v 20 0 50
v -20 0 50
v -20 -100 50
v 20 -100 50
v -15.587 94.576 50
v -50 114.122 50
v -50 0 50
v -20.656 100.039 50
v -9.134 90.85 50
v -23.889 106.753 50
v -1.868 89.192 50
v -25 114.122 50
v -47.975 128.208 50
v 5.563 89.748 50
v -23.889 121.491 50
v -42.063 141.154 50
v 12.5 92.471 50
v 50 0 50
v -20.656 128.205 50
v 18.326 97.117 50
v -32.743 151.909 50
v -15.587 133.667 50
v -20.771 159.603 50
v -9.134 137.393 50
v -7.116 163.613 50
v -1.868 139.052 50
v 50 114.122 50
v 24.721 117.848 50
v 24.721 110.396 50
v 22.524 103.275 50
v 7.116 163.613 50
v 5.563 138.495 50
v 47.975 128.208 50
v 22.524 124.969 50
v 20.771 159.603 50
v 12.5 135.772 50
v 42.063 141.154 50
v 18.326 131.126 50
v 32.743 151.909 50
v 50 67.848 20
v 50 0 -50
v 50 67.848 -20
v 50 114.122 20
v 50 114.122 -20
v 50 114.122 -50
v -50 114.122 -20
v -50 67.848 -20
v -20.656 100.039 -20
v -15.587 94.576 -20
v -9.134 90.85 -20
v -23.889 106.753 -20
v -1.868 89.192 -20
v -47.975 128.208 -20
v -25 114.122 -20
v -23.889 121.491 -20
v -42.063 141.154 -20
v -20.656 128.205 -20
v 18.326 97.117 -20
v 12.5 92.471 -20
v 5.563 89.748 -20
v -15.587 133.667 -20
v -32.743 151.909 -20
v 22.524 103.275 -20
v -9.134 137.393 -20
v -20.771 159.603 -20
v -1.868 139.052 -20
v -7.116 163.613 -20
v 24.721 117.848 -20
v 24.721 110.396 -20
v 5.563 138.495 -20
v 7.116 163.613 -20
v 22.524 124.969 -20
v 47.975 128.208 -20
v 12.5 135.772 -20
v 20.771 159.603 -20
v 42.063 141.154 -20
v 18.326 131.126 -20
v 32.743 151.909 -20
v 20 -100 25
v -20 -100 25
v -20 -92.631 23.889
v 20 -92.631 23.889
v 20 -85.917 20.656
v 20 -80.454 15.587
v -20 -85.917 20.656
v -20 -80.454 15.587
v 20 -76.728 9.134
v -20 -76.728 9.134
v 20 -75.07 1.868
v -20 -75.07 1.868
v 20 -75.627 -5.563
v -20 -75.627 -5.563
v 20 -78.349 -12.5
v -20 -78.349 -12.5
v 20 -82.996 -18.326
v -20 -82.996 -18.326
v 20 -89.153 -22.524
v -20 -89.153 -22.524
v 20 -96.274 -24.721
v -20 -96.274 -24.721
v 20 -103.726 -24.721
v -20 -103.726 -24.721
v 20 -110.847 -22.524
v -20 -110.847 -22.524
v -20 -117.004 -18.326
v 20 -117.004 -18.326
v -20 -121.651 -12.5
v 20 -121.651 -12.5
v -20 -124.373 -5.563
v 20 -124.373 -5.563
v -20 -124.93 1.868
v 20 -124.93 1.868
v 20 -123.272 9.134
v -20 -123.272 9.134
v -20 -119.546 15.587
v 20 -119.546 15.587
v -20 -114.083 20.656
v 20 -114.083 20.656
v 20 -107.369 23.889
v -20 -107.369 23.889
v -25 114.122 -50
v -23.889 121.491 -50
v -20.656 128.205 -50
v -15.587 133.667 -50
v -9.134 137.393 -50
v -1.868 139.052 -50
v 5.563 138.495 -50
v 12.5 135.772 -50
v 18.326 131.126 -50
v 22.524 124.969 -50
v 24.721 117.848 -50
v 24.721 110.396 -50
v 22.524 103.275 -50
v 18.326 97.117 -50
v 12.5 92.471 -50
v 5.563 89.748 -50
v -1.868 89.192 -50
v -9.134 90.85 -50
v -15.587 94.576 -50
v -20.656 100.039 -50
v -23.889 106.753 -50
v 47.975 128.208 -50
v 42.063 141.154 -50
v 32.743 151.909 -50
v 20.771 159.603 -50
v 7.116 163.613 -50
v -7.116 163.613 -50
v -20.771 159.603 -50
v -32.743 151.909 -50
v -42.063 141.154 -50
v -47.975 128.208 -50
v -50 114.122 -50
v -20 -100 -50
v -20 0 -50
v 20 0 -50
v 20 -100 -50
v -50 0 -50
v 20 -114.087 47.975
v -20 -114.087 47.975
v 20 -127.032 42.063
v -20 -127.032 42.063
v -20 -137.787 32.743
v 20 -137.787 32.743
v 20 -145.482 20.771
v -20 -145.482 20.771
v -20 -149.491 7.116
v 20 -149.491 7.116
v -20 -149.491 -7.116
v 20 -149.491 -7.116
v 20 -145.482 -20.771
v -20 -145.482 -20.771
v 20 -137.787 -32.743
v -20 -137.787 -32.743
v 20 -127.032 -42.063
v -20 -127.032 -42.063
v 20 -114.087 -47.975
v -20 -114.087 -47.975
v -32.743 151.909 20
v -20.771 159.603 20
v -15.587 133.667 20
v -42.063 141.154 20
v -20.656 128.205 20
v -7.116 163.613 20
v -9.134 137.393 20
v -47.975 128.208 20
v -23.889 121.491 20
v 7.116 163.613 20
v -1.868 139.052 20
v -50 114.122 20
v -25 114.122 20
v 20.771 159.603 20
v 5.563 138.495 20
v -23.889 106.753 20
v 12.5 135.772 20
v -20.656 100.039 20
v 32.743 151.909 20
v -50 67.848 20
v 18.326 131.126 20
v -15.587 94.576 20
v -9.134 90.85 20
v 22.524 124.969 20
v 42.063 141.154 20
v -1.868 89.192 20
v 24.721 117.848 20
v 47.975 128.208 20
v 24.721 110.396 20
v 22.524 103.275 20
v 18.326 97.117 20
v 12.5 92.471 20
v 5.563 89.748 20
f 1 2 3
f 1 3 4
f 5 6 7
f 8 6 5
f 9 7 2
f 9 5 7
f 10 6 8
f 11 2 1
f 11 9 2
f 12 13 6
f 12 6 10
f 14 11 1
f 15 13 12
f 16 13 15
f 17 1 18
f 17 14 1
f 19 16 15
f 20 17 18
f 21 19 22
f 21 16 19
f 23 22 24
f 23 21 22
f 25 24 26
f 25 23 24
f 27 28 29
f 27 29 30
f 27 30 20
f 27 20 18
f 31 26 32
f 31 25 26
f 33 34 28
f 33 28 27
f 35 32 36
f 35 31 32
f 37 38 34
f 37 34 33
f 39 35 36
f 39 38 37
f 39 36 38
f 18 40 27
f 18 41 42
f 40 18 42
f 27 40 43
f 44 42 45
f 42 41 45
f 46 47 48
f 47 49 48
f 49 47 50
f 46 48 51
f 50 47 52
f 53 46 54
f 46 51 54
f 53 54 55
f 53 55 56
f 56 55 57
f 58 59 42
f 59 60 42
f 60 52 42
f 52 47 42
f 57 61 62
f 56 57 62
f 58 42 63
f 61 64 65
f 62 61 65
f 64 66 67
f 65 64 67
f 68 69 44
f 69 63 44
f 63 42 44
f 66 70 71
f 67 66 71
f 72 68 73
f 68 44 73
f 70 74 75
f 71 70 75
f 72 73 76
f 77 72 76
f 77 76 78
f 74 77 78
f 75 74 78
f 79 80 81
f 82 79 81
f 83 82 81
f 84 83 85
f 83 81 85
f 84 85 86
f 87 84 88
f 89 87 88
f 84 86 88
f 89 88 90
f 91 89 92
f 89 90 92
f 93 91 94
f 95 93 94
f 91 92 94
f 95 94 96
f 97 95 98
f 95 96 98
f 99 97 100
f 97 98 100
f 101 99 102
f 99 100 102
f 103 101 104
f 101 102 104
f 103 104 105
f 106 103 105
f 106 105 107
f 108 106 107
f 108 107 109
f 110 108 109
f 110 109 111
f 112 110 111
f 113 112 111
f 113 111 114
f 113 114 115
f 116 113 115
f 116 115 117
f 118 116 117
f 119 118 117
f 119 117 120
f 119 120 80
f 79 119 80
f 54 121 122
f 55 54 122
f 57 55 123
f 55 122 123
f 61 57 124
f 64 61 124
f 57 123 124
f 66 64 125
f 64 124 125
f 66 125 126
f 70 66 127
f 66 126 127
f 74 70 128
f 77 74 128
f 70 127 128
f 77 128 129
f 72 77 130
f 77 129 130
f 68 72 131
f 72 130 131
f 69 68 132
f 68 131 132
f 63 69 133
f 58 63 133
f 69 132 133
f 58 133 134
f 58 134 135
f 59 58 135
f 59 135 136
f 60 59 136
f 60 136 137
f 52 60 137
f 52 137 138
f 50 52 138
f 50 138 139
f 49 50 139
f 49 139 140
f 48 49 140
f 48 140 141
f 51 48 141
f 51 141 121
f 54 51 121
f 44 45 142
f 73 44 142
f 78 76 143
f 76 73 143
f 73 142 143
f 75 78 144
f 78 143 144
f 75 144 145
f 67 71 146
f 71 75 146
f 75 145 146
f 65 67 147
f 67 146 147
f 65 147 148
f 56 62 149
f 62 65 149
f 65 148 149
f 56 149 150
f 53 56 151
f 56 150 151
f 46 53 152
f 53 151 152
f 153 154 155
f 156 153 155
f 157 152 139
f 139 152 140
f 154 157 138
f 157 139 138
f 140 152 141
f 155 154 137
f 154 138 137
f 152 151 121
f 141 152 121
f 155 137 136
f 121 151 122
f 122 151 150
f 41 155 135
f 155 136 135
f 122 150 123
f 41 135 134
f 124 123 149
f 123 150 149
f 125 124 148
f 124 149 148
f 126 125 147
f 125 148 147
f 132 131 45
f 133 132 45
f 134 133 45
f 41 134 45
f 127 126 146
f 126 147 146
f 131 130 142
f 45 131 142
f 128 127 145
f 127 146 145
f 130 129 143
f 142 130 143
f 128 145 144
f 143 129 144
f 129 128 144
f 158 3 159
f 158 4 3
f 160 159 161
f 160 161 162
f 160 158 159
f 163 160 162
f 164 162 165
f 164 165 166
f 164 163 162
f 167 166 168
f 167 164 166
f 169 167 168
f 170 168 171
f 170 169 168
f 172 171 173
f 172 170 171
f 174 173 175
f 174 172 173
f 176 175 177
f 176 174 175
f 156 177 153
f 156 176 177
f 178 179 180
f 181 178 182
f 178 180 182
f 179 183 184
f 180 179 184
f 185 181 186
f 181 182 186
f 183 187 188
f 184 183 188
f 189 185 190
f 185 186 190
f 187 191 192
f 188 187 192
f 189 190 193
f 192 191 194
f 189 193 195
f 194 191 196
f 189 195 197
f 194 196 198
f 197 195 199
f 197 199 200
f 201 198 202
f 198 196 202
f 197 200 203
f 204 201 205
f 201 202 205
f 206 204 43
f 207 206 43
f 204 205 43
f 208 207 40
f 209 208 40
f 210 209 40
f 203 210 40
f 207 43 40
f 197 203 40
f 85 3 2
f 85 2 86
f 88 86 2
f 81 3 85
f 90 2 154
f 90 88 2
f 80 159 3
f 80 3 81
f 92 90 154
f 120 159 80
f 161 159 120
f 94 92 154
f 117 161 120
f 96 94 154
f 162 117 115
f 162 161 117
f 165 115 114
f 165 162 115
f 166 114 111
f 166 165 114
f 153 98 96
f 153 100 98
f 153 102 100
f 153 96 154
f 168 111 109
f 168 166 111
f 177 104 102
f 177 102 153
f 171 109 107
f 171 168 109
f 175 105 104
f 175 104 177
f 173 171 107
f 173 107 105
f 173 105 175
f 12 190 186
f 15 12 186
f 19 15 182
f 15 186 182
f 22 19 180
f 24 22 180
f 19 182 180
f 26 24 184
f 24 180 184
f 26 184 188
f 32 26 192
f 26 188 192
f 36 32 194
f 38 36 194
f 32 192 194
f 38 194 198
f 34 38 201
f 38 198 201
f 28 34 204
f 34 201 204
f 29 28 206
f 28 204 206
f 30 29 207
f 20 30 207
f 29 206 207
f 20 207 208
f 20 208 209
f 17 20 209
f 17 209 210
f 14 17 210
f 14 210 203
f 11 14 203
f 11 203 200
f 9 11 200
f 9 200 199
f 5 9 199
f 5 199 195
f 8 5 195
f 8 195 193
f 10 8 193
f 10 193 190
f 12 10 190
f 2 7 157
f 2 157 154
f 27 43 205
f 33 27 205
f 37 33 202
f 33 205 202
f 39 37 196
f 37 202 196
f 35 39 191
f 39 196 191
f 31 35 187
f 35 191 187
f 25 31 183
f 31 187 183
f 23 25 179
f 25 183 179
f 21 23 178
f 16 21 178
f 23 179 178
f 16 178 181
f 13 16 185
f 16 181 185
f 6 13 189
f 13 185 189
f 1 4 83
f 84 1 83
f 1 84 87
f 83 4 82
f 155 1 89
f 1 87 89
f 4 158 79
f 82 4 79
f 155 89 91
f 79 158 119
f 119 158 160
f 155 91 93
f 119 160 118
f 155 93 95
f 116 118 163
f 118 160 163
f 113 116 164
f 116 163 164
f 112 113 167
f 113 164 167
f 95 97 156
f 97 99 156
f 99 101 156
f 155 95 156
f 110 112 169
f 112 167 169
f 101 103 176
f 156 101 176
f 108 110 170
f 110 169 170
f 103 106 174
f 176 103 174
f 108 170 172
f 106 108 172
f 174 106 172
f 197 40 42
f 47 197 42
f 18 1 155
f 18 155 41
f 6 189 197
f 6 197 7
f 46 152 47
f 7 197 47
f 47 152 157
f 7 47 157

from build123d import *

# Parameters (mm, degrees)
BOSS_EXTRUDE1_DEPTH        = 50
BOSS_EXTRUDE1_DEPTH_BACK   = 50
CUT_EXTRUDE1_DEPTH         = 199.584759445
F_25_0_50_DIAMETER_HOLE1_D = 50
SKETCH7_W                  = 40
SKETCH7_H                  = 50
REVOLVE1_ANGLE             = 180
F_1_0_50_DIAMETER_HOLE1_D  = 50


with BuildPart() as part:
    # Sketch1 → Boss-Extrude1 (new, two sides: drawn at the far end of the back side and taken through both)
    with BuildSketch(Plane.XY.offset(-BOSS_EXTRUDE1_DEPTH_BACK)):
        with BuildLine():
            Line((20, 0), (50, 0))
            Line((50, 0), (50, 114.121621622))
            ThreePointArc((50, 114.121621622), (0, 164.121621622), (-50, 114.121621622))
            Line((-50, 114.121621622), (-50, 0))
            Line((-50, 0), (-20, 0))
            Line((-20, 0), (-20, -100))
            Line((-20, -100), (20, -100))
            Line((20, -100), (20, 0))
        make_face()
    extrude(amount=BOSS_EXTRUDE1_DEPTH + BOSS_EXTRUDE1_DEPTH_BACK)

    # Sketch4 → Cut-Extrude1 (cut, through all)
    with BuildSketch(Plane(origin=(50, 0, 0), x_dir=(0, 0, -1), z_dir=(1, 0, 0))):
        Polygon((-20, 114.121621622), (-20, 67.847884716), (20, 67.847884716), (20, 168.662891807), (-20, 168.662891807), align=None)
    extrude(amount=-CUT_EXTRUDE1_DEPTH, mode=Mode.SUBTRACT)

    # Ø25.0 (50) Diameter Hole1 (through all)
    with Locations(Plane.XY.offset(50)):
        with Locations((0, 114.121621622)):
            Hole(F_25_0_50_DIAMETER_HOLE1_D / 2)

    # Sketch7 → Revolve1 (revolve)
    with BuildSketch(Plane.XZ.offset(100)):
        with Locations((0, 25)):
            Rectangle(SKETCH7_W, SKETCH7_H)
    revolve(axis=Axis((20, -100, 0), (1, 0, 0)), revolution_arc=REVOLVE1_ANGLE)

    # Ø1.0 (50) Diameter Hole1 (through all)
    with Locations(Plane(origin=(20, 0, 0), x_dir=(0, 0, -1), z_dir=(1, 0, 0))):
        with Locations((0, -100)):
            Hole(F_1_0_50_DIAMETER_HOLE1_D / 2)


solid = part.part
